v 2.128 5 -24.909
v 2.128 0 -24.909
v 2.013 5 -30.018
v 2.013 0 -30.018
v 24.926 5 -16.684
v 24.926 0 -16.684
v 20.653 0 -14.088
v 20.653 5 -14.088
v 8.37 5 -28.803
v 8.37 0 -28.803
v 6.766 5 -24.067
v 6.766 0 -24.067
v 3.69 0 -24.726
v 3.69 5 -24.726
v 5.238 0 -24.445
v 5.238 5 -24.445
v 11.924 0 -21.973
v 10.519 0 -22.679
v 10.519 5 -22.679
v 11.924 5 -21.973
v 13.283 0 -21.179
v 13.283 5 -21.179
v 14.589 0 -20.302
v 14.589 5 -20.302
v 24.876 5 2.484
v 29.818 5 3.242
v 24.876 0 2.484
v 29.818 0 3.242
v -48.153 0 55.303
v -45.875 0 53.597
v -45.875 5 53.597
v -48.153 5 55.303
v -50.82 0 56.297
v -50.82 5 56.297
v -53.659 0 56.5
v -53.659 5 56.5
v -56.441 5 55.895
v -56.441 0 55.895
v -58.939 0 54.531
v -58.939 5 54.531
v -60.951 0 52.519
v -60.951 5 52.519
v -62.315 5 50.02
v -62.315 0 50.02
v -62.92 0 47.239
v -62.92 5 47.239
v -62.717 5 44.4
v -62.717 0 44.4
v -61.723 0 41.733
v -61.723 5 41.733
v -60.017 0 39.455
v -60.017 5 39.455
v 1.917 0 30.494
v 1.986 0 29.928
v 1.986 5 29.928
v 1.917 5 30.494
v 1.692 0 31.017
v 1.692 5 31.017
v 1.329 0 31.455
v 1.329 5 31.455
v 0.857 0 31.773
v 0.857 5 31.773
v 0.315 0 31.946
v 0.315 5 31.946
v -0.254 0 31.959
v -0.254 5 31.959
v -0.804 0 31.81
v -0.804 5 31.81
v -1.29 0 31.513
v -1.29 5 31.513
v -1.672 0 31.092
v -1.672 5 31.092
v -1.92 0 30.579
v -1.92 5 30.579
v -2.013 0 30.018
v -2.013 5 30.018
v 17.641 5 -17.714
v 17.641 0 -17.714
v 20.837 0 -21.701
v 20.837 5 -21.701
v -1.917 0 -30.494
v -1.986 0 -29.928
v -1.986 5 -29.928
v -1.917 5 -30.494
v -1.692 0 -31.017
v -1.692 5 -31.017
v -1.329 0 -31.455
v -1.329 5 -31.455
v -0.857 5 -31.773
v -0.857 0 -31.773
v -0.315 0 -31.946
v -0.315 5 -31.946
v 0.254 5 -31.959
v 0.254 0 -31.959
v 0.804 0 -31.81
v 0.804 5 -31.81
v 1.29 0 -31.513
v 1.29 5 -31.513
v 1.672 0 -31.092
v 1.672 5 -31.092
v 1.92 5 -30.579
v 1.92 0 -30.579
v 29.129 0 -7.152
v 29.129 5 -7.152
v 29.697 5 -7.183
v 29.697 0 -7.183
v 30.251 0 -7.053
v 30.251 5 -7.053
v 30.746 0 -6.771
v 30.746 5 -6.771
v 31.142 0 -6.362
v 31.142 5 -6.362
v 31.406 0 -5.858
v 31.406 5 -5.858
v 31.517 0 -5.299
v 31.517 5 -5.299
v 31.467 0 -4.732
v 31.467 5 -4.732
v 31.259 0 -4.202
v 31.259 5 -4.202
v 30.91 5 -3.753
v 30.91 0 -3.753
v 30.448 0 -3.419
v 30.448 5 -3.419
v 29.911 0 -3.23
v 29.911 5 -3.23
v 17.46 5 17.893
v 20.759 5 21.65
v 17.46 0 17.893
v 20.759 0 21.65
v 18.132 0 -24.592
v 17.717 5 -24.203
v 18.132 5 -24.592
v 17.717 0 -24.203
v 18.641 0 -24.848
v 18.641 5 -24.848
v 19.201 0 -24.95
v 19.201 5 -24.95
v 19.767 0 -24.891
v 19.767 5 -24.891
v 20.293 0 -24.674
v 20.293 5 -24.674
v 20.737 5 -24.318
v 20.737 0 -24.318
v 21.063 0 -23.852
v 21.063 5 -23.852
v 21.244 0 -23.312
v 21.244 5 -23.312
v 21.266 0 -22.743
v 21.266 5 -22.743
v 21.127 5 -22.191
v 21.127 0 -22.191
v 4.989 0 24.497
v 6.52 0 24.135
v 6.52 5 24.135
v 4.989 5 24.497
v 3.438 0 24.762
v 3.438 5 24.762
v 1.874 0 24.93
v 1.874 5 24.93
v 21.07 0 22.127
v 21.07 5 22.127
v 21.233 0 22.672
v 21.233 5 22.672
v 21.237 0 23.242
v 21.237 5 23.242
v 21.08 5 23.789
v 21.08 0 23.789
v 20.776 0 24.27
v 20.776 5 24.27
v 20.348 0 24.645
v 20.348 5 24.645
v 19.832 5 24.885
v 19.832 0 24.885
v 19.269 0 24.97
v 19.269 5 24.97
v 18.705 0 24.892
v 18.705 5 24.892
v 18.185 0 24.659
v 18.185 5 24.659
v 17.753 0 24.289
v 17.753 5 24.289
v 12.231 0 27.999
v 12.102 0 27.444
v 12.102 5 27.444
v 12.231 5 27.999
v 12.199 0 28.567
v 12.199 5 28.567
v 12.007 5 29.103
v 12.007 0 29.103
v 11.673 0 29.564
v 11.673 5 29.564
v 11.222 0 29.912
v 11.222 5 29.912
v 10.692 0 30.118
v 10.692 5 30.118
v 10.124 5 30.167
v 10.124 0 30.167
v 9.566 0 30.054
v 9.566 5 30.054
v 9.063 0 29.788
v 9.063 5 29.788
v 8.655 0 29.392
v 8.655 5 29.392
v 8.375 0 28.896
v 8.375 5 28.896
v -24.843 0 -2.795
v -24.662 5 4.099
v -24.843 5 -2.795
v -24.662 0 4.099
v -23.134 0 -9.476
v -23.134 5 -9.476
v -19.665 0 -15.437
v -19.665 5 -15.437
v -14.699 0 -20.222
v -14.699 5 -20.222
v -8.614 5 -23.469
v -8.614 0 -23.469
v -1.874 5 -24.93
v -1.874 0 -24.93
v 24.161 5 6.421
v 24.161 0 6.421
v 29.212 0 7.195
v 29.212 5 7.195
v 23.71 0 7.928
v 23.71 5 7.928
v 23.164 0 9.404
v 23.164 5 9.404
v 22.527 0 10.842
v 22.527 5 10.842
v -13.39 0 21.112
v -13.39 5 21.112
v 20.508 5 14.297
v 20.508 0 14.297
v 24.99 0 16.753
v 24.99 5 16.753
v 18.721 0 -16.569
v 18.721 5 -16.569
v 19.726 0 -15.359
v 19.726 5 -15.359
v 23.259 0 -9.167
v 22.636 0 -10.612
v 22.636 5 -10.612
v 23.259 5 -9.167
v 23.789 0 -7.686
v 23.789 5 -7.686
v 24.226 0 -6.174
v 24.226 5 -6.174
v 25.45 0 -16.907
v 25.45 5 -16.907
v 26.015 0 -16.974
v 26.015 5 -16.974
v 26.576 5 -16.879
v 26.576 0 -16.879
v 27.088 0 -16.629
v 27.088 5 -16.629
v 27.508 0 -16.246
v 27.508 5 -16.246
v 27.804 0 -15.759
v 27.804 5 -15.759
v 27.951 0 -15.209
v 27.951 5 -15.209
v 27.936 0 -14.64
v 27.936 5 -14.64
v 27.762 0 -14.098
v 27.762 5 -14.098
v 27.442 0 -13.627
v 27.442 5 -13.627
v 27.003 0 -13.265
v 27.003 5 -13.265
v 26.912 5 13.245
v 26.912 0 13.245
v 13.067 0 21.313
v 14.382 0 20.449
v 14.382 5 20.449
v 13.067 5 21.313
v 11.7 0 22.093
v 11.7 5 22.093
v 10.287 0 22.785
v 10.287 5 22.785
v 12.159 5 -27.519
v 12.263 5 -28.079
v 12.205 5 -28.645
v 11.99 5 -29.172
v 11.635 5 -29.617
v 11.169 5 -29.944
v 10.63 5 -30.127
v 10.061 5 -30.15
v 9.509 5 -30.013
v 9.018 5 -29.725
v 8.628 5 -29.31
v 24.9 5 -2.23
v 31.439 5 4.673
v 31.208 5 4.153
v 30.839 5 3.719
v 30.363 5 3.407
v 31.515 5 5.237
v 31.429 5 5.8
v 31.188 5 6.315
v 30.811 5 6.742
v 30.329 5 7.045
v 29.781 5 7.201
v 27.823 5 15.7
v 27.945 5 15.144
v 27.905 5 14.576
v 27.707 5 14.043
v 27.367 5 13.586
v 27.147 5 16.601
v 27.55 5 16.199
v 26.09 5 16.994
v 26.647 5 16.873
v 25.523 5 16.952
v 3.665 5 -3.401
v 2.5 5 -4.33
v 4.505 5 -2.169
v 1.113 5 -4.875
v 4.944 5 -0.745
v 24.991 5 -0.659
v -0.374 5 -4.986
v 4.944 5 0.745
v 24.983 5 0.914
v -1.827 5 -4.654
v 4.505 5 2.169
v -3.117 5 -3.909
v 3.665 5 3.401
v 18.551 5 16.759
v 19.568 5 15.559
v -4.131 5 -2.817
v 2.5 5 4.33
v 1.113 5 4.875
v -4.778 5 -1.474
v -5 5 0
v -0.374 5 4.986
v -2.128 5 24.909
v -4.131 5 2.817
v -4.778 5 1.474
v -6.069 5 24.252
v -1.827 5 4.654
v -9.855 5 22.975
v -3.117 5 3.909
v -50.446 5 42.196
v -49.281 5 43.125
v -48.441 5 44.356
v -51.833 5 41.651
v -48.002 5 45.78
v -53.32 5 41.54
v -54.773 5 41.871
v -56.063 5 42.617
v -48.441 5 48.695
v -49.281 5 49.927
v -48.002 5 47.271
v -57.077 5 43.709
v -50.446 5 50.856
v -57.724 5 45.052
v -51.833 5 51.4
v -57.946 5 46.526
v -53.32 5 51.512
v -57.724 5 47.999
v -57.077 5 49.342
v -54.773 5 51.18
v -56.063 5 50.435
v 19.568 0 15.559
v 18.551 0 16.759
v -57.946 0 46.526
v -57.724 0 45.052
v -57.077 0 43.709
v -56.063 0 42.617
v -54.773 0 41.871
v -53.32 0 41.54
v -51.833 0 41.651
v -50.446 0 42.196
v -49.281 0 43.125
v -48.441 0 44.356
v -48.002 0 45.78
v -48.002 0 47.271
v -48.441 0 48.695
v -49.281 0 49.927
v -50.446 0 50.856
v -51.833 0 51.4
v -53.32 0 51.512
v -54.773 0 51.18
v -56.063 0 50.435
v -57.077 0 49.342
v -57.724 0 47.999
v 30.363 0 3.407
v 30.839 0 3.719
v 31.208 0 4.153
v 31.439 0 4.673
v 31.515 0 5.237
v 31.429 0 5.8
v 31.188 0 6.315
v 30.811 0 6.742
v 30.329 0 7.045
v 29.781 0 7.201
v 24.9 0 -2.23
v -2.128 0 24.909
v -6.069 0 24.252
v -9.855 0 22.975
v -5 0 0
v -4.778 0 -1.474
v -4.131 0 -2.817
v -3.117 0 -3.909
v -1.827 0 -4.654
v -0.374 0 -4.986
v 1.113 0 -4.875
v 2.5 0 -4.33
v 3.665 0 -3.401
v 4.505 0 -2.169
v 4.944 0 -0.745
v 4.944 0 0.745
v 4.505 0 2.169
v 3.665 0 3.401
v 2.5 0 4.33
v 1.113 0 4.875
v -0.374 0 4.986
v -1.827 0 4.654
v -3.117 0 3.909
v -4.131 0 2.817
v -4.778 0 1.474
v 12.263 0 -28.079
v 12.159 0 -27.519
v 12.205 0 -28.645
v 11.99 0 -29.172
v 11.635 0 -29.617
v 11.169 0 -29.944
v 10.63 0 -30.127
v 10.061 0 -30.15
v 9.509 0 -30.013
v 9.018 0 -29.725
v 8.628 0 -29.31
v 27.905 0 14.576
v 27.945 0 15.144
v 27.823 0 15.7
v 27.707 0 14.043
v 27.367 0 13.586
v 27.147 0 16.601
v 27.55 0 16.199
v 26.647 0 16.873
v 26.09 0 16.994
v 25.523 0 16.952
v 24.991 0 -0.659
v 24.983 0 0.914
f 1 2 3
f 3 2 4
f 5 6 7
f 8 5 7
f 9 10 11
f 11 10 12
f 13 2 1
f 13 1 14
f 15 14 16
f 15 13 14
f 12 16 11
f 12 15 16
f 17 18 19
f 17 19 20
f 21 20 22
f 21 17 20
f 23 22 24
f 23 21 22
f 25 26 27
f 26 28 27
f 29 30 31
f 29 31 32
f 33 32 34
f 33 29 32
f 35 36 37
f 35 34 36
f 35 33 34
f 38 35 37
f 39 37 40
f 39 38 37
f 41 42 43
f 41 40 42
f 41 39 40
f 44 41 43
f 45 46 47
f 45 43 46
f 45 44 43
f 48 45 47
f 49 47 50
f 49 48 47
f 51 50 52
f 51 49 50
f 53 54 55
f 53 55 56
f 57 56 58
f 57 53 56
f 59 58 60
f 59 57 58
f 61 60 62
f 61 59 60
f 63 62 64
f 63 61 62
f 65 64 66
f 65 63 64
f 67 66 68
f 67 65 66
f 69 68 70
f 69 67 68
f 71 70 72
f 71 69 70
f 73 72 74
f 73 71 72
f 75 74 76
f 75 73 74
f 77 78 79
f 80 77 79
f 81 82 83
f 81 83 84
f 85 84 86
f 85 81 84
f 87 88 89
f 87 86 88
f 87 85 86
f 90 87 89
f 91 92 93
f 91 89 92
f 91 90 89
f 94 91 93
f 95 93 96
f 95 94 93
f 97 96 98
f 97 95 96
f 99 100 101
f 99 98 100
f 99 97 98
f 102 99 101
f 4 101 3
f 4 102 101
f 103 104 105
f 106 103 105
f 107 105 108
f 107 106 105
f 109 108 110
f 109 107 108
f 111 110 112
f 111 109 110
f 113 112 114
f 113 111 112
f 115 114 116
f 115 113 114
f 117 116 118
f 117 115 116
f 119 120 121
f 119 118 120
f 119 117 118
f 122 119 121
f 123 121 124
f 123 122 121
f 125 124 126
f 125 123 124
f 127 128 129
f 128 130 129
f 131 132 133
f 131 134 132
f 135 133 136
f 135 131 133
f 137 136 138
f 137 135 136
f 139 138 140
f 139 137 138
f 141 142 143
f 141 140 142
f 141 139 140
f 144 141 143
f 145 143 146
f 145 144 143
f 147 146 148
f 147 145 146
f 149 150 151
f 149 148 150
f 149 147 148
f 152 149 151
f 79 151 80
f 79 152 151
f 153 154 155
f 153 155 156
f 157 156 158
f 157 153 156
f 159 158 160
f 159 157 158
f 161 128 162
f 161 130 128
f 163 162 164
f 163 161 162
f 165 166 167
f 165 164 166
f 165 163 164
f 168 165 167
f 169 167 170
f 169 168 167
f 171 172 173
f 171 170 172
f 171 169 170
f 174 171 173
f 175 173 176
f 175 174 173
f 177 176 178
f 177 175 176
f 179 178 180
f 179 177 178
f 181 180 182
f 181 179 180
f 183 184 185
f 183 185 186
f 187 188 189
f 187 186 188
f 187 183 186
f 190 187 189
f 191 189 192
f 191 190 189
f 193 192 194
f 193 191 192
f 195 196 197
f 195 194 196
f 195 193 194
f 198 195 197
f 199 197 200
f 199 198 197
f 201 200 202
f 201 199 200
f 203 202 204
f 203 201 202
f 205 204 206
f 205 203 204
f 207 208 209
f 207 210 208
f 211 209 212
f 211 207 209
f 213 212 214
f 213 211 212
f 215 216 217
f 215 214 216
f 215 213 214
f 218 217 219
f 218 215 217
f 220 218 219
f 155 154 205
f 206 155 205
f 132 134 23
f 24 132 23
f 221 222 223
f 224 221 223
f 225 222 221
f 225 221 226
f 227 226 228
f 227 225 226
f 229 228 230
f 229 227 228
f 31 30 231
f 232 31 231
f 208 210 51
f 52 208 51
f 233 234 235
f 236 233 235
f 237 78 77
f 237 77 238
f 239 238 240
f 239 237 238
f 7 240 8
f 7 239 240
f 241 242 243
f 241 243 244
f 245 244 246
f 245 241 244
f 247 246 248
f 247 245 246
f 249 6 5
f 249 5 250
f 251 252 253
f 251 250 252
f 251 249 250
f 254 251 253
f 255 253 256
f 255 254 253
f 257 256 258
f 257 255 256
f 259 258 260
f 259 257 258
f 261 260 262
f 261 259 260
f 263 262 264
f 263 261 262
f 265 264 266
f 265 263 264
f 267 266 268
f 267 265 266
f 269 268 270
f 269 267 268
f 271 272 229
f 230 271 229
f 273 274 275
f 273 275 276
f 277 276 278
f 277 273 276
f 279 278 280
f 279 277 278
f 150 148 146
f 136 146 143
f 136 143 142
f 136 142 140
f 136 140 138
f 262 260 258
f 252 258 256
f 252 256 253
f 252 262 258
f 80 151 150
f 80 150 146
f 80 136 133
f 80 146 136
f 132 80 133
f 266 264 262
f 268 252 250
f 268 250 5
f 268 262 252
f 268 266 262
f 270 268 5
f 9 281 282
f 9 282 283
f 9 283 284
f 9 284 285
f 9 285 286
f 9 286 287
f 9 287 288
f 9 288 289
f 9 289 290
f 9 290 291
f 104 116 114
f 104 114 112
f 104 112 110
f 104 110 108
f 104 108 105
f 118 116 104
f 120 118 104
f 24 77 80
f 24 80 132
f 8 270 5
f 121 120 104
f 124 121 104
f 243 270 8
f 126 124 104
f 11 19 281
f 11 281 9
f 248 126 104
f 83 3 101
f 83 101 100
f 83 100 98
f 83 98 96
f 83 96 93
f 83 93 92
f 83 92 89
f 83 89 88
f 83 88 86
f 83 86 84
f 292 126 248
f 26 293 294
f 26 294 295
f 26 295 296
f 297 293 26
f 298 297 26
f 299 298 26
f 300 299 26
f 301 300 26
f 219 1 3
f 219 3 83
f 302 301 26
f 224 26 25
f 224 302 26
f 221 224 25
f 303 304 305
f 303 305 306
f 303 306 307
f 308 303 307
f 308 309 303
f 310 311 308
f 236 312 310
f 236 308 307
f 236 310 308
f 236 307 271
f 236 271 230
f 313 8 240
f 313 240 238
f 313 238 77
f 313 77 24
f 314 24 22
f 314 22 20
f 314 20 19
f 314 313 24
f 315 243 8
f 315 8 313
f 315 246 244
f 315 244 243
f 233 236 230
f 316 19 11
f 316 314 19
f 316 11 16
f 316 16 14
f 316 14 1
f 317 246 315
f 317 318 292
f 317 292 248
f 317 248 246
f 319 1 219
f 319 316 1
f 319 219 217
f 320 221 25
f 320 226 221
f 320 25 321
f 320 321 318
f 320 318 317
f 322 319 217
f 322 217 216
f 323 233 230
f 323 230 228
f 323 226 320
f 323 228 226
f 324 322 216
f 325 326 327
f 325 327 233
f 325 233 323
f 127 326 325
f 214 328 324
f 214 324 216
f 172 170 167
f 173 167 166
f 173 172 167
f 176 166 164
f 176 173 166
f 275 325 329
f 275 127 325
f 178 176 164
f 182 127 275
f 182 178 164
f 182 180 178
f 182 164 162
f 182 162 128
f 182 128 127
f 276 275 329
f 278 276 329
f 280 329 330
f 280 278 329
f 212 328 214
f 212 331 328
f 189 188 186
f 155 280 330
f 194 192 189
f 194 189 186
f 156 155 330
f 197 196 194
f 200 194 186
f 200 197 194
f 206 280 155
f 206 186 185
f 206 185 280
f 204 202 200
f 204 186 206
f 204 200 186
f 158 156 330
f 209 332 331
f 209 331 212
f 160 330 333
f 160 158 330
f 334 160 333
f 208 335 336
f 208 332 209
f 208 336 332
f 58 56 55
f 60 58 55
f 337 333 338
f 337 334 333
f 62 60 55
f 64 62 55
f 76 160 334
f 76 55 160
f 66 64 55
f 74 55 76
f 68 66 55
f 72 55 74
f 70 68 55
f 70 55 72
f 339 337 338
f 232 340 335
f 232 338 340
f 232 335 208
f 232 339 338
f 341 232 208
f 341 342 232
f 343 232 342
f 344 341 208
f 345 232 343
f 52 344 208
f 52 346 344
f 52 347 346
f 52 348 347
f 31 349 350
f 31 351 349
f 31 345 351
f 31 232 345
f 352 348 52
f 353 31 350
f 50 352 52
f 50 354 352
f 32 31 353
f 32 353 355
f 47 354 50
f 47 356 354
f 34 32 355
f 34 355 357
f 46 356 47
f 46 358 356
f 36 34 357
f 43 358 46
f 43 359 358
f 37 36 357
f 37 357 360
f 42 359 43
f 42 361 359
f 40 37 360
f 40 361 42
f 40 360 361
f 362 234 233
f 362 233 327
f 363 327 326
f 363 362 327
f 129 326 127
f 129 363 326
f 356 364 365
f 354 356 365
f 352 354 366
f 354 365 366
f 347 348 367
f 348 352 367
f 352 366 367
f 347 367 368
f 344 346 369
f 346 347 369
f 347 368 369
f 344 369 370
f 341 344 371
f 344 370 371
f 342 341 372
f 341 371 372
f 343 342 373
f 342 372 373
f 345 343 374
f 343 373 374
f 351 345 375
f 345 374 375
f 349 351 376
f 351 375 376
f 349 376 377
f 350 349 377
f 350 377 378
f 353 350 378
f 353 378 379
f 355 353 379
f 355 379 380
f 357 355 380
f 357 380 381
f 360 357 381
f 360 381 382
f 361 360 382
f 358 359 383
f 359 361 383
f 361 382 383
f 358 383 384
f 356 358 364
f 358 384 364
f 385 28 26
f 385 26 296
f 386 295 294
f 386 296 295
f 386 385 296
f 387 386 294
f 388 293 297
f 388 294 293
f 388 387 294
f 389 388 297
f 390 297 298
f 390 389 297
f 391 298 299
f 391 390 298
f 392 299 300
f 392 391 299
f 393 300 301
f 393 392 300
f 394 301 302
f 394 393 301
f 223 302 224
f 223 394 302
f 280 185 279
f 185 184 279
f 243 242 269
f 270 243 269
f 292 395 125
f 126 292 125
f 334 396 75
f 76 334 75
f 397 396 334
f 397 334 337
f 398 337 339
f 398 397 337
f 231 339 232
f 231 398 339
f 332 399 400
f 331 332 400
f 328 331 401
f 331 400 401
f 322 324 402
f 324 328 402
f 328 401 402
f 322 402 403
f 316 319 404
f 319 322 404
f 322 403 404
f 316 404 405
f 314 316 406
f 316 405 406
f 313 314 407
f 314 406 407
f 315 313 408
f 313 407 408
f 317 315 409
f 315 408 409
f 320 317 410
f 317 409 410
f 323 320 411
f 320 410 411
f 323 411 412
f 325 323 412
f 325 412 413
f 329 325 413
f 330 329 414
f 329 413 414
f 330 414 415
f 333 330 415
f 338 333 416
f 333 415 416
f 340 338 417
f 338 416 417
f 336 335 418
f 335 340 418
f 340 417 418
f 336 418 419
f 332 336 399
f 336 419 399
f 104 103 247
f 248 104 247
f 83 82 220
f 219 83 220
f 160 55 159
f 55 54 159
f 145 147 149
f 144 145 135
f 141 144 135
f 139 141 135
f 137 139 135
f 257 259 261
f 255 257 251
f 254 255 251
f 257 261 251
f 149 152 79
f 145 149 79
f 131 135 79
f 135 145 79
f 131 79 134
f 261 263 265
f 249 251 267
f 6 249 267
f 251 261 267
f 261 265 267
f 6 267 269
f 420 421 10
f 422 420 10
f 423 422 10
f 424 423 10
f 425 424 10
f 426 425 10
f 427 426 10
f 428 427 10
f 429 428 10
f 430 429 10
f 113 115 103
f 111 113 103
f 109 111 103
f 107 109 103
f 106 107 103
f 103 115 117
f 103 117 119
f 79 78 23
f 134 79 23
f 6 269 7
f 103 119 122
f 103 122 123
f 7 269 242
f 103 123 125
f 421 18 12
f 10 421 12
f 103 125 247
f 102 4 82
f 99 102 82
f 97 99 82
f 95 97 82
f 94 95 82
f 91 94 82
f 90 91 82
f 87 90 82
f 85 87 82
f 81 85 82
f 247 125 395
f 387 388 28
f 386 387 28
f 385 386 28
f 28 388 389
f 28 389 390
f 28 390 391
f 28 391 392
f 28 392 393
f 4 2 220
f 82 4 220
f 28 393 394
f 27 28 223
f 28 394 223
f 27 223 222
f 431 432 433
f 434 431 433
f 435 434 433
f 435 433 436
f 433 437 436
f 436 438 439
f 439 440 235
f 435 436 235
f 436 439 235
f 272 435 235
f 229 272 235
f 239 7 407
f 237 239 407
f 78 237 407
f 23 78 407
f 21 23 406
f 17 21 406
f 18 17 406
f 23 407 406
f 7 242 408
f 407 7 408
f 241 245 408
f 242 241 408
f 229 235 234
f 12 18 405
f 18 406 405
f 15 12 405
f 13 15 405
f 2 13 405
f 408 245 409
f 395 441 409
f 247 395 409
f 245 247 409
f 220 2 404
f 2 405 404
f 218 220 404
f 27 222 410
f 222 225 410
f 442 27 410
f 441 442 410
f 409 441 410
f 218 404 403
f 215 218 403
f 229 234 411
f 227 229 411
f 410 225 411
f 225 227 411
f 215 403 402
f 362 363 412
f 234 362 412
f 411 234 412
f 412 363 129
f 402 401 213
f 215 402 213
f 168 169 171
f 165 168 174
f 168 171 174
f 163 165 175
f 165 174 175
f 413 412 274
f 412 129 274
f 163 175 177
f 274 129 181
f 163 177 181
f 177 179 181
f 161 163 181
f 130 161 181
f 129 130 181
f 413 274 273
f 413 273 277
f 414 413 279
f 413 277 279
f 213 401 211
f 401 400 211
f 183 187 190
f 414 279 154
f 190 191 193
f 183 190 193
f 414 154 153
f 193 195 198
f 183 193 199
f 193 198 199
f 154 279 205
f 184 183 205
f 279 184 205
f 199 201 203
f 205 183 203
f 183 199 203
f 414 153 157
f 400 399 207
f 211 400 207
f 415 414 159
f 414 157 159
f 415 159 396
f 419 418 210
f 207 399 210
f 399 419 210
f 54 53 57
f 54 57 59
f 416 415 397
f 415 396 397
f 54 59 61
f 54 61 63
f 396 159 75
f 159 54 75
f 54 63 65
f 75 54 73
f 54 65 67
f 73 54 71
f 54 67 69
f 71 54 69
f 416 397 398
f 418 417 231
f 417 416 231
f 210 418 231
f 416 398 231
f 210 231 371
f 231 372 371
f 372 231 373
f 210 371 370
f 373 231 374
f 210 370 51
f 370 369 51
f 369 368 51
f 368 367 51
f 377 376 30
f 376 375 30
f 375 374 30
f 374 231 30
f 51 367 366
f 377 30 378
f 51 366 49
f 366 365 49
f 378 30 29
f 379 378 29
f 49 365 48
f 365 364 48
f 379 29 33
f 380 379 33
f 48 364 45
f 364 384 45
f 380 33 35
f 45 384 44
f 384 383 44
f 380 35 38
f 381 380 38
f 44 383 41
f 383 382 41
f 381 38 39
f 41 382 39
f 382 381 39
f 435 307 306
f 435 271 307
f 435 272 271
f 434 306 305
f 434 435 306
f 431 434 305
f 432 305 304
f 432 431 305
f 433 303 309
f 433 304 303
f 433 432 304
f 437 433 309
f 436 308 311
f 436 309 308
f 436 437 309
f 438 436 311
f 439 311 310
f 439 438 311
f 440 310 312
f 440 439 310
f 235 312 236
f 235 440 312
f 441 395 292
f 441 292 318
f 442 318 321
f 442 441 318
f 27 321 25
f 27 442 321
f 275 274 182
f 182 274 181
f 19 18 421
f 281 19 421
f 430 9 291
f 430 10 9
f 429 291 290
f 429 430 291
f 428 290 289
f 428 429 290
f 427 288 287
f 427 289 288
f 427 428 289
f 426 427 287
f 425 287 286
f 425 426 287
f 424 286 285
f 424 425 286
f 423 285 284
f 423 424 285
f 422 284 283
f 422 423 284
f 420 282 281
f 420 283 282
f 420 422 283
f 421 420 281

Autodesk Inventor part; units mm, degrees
ref_plane "YZ Plane" through (0, 0, 0) normal (1, 0, 0) x (0, 1, 0)
ref_plane "XZ Plane" through (0, 0, 0) normal (0, 1, 0) x (-1, 0, 0)
ref_plane "XY Plane" through (0, 0, 0) normal (0, 0, 1) x (1, 0, 0)
sketch "Sketch1" plane through (0, 0, 0) normal (0, 1, 0) x (-1, 0, 0)
  line L0 (-2.1276, -24.9093) -> (-2.0134, -30.0178)
  line L1 (1.9856, -29.9284) -> (1.8739, -24.9297)
  arc A0 (-2.0134, -30.0178) -> (1.9856, -29.9284) centre (-0.0139, -29.9731) ccw
  arc A1 (-12.1587, -27.5189) -> (-8.3703, -28.8026) centre (-10.2645, -28.1608) ccw
  line L2 (-8.3703, -28.8026) -> (-6.7656, -24.0671)
  line L3 (-10.5187, -22.6794) -> (-12.1587, -27.5189)
  arc A2 (-20.8374, -21.7008) -> (-17.7166, -24.2028) centre (-19.277, -22.9518) ccw
  line L4 (-17.7166, -24.2028) -> (-14.589, -20.3017)
  line L5 (-17.6412, -17.7141) -> (-20.8374, -21.7008)
  arc A3 (-27.0029, -13.2653) -> (-24.926, -16.6838) centre (-25.9644, -14.9745) ccw
  line L6 (-24.926, -16.6838) -> (-20.6528, -14.0877)
  line L7 (-22.6359, -10.6121) -> (-27.0029, -13.2653)
  arc A4 (-29.9114, -3.2297) -> (-29.1289, -7.1525) centre (-29.5202, -5.1911) ccw
  line L8 (-29.1289, -7.1525) -> (-24.2255, -6.1744)
  line L9 (-24.9003, -2.2302) -> (-29.9114, -3.2297)
  arc A5 (-29.2121, 7.1953) -> (-29.8185, 3.2416) centre (-29.5153, 5.2185) ccw
  line L10 (-29.8185, 3.2416) -> (-24.8763, 2.4836)
  line L11 (-24.1614, 6.4207) -> (-29.2121, 7.1953)
  arc A6 (-24.9895, 16.7526) -> (-26.9116, 13.2446) centre (-25.9505, 14.9986) ccw
  line L12 (-26.9116, 13.2446) -> (-22.5267, 10.842)
  line L13 (-20.5083, 14.2972) -> (-24.9895, 16.7526)
  arc A7 (-17.7527, 24.2892) -> (-20.7587, 21.6502) centre (-19.2557, 22.9697) ccw
  line L14 (-20.7587, 21.6502) -> (-17.46, 17.8927)
  line L15 (-14.3816, 20.4492) -> (-17.7527, 24.2892)
  arc A8 (-8.3747, 28.8961) -> (-12.102, 27.4444) centre (-10.2384, 28.1703) ccw
  line L16 (-12.102, 27.4444) -> (-10.2873, 22.7853)
  line L17 (-6.5202, 24.1348) -> (-8.3747, 28.8961)
  arc A9 (2.0134, 30.0178) -> (-1.9856, 29.9284) centre (0.0139, 29.9731) ccw
  line L18 (-1.9856, 29.9284) -> (-1.8739, 24.9297)
  line L19 (2.1276, 24.9093) -> (2.0134, 30.0178)
  arc A10 (1.8739, -24.9297) -> (24.6616, 4.0993) centre (0, 0) ccw
  circle A11 centre (52.9459, 46.5257) radius 5
  line L20 (45.8748, 53.5968) -> (13.3899, 21.1118)
  line L21 (24.6616, 4.0993) -> (60.017, 39.4546)
  arc A12 (60.017, 39.4546) -> (45.8748, 53.5968) centre (52.9459, 46.5257) ccw
  arc A13 (13.3899, 21.1118) -> (2.1276, 24.9093) centre (0, 0) ccw
  arc A14 (-1.8739, 24.9297) -> (-6.5202, 24.1348) centre (0, 0) ccw
  arc A15 (-10.2873, 22.7853) -> (-14.3816, 20.4492) centre (0, 0) ccw
  arc A16 (-17.46, 17.8927) -> (-20.5083, 14.2972) centre (0, 0) ccw
  arc A17 (-22.5267, 10.842) -> (-24.1614, 6.4207) centre (0, 0) ccw
  arc A18 (-24.8763, 2.4836) -> (-24.9003, -2.2302) centre (0, 0) ccw
  arc A19 (-24.2255, -6.1744) -> (-22.6359, -10.6121) centre (0, 0) ccw
  arc A20 (-20.6528, -14.0877) -> (-17.6412, -17.7141) centre (0, 0) ccw
  arc A21 (-14.589, -20.3017) -> (-10.5187, -22.6794) centre (0, 0) ccw
  arc A22 (-6.7656, -24.0671) -> (-2.1276, -24.9093) centre (0, 0) ccw
  circle A23 centre (0, 0) radius 5
  point P0 (28.2843, 28.2843)
  dimension "d9" = 180
  dimension "d17" = 10
  dimension "d18" = 10
  dimension "d19" = 20
  dimension "d20" = 25
  dimension "d21" = 5
  dimension "d22" = 2
  dimension "d23" = 50
extrude "Extrusion1" add sketch "Sketch1" along normal blind 5
properties part number "gerigi"
